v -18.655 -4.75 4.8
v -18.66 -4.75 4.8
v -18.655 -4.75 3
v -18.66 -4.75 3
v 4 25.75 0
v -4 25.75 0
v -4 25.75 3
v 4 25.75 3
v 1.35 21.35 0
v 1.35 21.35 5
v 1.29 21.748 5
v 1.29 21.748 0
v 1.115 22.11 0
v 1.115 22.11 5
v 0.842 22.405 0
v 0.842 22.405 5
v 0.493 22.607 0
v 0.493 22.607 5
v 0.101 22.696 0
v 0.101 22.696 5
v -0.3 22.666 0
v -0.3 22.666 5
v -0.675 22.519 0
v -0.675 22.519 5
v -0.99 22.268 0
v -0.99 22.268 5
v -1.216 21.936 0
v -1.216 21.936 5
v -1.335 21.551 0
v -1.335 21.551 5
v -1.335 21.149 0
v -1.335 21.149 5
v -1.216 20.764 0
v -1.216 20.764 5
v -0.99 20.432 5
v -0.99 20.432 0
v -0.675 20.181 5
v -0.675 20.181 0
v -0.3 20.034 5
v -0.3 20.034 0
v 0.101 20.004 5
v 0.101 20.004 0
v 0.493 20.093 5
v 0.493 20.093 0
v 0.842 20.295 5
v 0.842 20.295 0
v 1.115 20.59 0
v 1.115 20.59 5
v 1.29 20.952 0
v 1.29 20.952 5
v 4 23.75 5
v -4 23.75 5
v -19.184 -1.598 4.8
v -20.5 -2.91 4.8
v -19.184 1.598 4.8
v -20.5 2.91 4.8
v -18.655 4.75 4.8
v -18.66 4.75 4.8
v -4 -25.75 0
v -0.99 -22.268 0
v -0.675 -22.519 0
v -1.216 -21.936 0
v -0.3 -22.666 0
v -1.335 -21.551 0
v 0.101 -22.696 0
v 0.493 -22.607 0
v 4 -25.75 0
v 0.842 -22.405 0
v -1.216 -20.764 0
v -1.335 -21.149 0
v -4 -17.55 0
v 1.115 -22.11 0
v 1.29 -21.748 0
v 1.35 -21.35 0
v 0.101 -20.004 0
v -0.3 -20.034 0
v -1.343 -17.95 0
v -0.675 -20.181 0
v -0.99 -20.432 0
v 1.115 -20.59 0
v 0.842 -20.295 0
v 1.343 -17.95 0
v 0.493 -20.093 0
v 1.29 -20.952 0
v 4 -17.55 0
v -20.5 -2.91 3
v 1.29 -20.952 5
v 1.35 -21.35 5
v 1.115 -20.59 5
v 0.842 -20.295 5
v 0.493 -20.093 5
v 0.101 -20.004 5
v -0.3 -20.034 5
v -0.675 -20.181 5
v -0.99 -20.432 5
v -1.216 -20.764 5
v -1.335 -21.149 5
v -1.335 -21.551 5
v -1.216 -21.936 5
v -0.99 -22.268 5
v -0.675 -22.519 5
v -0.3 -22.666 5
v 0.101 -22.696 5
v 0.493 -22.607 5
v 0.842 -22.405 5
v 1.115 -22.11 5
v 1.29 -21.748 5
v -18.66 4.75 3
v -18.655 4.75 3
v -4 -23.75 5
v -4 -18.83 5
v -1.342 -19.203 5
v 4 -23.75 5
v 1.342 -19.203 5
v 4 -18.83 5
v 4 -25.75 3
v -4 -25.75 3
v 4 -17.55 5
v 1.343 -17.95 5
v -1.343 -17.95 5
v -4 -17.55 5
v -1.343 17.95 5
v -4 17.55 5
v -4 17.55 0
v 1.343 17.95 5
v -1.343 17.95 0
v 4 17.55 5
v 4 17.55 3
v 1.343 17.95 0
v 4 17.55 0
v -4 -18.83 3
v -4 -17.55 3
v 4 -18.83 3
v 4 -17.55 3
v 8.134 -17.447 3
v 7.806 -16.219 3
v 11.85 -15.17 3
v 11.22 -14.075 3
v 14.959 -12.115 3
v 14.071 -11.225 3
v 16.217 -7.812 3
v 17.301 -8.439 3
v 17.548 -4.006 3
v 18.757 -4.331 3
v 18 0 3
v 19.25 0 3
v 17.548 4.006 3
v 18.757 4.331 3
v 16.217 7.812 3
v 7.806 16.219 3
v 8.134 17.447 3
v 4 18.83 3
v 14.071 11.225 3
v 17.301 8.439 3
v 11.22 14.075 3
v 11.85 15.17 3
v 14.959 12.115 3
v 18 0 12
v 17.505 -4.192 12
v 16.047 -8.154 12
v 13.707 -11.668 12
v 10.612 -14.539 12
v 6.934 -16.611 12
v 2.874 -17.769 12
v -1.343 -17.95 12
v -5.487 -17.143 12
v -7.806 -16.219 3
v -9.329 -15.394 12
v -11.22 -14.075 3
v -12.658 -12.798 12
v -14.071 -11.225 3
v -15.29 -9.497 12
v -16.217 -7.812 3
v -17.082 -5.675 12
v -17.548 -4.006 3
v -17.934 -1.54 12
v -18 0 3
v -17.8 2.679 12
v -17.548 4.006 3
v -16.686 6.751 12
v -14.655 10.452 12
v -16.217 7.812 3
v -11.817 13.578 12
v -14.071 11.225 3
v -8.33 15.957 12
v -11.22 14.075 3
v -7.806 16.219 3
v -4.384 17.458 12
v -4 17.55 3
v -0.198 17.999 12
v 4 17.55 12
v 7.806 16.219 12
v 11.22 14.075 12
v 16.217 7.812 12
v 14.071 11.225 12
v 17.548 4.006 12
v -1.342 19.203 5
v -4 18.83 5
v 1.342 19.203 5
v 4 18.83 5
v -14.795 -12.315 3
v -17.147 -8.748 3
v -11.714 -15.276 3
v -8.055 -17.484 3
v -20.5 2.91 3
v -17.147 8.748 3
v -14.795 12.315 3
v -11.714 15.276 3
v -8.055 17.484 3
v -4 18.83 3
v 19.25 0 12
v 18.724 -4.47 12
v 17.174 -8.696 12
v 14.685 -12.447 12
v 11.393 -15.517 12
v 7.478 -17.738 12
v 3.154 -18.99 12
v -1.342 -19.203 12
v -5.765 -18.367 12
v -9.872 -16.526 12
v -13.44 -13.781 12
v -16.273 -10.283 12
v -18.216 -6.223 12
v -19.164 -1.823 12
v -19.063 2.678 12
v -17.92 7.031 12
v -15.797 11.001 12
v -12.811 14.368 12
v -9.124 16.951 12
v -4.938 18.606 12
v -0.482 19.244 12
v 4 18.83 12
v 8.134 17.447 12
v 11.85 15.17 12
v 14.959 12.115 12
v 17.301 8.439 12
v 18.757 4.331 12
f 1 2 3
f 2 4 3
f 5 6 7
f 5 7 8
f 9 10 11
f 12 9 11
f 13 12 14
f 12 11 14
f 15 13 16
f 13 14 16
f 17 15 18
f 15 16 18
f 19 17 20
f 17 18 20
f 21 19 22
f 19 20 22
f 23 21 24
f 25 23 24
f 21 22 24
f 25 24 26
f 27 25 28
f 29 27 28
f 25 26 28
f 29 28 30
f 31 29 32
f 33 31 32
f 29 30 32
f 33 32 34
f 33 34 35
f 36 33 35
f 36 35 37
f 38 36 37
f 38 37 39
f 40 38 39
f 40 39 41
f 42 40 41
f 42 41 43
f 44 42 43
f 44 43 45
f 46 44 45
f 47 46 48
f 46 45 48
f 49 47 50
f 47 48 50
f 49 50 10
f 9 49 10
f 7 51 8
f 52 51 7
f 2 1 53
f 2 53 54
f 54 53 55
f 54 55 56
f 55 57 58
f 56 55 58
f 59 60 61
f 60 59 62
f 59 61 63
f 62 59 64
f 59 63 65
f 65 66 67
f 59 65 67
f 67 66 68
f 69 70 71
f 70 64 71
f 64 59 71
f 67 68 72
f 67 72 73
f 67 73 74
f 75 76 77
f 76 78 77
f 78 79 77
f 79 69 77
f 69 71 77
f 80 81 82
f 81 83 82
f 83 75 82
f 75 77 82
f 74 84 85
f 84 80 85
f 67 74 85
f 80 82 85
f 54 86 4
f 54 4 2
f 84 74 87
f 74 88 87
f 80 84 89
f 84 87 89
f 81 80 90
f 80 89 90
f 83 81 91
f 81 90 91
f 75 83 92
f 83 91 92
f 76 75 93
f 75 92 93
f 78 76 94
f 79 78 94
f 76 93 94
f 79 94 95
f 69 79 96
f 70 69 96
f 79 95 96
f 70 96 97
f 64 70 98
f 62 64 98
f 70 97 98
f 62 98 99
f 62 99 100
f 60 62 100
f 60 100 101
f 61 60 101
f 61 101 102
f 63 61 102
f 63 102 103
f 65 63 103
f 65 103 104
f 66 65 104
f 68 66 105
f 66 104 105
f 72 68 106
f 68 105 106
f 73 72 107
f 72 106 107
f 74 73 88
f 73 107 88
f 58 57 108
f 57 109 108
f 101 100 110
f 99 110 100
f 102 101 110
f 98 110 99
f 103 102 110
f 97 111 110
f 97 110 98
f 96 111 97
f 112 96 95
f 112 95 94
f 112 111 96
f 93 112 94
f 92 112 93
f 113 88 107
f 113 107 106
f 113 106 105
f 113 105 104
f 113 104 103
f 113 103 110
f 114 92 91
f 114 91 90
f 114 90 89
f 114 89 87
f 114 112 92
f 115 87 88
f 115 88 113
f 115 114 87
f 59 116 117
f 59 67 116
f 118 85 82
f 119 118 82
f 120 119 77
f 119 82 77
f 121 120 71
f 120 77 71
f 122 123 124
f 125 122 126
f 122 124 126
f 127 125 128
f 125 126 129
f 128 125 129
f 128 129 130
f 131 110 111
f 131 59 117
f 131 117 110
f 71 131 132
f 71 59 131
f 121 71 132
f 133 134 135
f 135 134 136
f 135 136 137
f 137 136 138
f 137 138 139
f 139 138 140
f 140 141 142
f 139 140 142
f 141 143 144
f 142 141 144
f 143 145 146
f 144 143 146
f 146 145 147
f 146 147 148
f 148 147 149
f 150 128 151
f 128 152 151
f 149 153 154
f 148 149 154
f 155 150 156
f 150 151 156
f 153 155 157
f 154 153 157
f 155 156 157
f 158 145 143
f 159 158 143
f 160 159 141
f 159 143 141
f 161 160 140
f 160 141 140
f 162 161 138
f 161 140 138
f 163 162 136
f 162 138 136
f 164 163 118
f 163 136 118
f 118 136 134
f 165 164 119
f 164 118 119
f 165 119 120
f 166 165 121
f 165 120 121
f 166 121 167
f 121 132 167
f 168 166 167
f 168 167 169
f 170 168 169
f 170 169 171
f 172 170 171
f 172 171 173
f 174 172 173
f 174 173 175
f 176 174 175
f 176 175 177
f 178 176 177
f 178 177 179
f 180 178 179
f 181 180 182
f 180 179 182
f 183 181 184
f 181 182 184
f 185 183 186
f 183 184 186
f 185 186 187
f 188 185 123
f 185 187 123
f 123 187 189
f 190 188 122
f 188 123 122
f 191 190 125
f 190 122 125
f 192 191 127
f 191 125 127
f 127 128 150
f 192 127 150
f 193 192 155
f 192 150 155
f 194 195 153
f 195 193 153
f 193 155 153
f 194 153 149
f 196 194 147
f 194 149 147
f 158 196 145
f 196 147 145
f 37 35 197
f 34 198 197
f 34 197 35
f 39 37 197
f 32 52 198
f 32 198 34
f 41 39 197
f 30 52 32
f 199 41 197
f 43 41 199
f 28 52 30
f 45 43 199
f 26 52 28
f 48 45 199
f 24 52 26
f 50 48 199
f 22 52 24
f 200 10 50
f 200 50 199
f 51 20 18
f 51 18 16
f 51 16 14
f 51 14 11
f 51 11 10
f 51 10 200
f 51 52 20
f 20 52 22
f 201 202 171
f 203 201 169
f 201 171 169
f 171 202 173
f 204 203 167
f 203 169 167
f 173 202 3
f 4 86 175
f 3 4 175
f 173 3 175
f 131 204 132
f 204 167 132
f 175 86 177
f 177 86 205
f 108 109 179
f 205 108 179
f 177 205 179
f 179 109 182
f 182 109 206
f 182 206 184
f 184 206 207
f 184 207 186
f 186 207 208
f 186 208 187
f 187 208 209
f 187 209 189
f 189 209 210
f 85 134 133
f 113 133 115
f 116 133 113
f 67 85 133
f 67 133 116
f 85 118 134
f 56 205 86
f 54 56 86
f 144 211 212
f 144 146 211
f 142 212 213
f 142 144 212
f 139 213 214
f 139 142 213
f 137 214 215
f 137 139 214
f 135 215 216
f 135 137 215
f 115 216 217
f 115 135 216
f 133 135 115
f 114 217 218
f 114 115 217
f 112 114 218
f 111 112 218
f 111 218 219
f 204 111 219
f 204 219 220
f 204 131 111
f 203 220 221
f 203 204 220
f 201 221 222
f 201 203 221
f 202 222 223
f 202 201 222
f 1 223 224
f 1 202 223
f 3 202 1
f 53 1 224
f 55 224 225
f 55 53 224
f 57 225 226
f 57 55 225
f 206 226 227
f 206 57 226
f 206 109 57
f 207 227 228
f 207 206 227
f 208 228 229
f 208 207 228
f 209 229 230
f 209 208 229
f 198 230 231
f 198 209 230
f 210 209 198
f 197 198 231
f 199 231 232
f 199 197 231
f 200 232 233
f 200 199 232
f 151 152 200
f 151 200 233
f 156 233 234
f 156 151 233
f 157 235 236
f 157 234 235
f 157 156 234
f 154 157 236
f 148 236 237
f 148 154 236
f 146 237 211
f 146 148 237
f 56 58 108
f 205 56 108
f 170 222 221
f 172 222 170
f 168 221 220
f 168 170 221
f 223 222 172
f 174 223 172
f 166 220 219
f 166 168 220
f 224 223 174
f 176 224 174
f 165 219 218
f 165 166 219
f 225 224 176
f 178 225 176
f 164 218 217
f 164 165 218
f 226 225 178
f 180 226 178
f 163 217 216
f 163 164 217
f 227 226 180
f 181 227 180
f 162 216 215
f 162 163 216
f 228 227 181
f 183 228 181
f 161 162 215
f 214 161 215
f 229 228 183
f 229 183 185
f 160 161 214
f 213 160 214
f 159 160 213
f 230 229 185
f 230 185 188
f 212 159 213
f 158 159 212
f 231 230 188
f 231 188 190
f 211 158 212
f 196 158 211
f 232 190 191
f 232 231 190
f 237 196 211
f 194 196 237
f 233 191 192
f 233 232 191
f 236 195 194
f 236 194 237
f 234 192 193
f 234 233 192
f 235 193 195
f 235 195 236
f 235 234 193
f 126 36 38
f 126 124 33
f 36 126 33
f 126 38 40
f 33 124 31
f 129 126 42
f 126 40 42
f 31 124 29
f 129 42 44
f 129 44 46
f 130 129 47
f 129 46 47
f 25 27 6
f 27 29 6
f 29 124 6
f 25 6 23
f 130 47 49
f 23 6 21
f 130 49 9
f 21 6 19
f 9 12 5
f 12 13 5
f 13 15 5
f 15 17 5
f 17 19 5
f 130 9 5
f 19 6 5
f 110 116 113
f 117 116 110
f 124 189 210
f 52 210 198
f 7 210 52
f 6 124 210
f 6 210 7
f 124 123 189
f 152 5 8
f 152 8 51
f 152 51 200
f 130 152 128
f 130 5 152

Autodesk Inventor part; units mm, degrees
ref_plane "YZ Plane" through (0, 0, 0) normal (1, 0, 0) x (0, 1, 0)
ref_plane "XZ Plane" through (0, 0, 0) normal (0, 1, 0) x (-1, 0, 0)
ref_plane "XY Plane" through (0, 0, 0) normal (0, 0, 1) x (1, 0, 0)
sketch "スケッチ1" plane through (0, 0, 0) normal (0, 0, 1) x (1, 0, 0)
  line L0 (-4, 25.75) -> (4, 25.75)
  line L1 (4, 25.75) -> (4, 17.5499)
  line L2 (-4, 17.5499) -> (-4, 25.75)
  line L3 (4, -17.5499) -> (4, -25.75)
  line L4 (4, -25.75) -> (-4, -25.75)
  line L5 (-4, -25.75) -> (-4, -17.5499)
  line L6 (0, -36.05) -> (0, 36.05) projected
  arc A0 (4, 17.5499) -> (-4, 17.5499) centre (0, 0) ccw
  arc A1 (-4, -17.5499) -> (4, -17.5499) centre (0, 0) ccw
  point P0 (0, 18)
  dimension "d1" = 18
  dimension "d2" = 18
  dimension "d3" = 51.5
  dimension "d4" = 25.75
  dimension "d5" = 8
extrude "押し出し1" add sketch "スケッチ1" along normal blind 5
chamfer "面取り1" distance 2 angle 45 2 edges at (0, 25.75, 5) (0, -25.75, 5)
sketch "スケッチ2" plane through (0, 0, 5) normal (0, 0, 1) x (1, 0, 0)
  line L0 (4, 25.75) -> (4, 17.5499) projected
  circle A0 centre (0, 0) radius 18
  circle A1 centre (0, 0) radius 19.25
  dimension "d15" = 38.5
extrude "押し出し2" add sketch "スケッチ2" along normal blind 7 and the other way blind 2
sketch "スケッチ3" plane through (0, 0, 3) normal (0, 0, -1) x (-1, 0, 0)
  line L0 (18.6548, 4.75) -> (20.5, 4.75)
  line L1 (20.5, 4.75) -> (20.5, -4.75)
  line L2 (20.5, -4.75) -> (18.6548, -4.75)
  arc A0 (4, -18.8298) -> (4, 18.8298) centre (0, 0) ccw projected
  line L3 (28.45, 0) -> (-27.2, 0) projected
  arc A1 (4, -17.5499) -> (4, 17.5499) centre (0, 0) ccw projected
  point P0 (20.5, 0)
  point P1 (18, 0)
  dimension "d16" = 9.5
  dimension "d17" = 2.5
extrude "押し出し3" add sketch "スケッチ3" against normal blind 1.8
chamfer "面取り2" distance 1.84 angle 45 2 edges at (-20.5, 4.75, 3.9) (-20.5, -4.75, 3.9)
sketch "スケッチ4" plane through (0, 0, 5) normal (0, 0, 1) x (1, 0, 0)
  circle A0 centre (0, 21.35) radius 1.35
  circle A1 centre (0, -21.35) radius 1.35
  line L0 (0, 20) -> (0, -20)
  point P0 (0, 0)
  point P1 (0, 0)
  dimension "d23" = 2.7
  dimension "d24" = 2.7
  dimension "d25" = 40
extrude "押し出し4" cut sketch "スケッチ4" against normal up to surface (5 mm away)
equation "\"d4\" = 0.5 * d3"
equation "\"d24\" = d23"
properties part number "conectcover"
